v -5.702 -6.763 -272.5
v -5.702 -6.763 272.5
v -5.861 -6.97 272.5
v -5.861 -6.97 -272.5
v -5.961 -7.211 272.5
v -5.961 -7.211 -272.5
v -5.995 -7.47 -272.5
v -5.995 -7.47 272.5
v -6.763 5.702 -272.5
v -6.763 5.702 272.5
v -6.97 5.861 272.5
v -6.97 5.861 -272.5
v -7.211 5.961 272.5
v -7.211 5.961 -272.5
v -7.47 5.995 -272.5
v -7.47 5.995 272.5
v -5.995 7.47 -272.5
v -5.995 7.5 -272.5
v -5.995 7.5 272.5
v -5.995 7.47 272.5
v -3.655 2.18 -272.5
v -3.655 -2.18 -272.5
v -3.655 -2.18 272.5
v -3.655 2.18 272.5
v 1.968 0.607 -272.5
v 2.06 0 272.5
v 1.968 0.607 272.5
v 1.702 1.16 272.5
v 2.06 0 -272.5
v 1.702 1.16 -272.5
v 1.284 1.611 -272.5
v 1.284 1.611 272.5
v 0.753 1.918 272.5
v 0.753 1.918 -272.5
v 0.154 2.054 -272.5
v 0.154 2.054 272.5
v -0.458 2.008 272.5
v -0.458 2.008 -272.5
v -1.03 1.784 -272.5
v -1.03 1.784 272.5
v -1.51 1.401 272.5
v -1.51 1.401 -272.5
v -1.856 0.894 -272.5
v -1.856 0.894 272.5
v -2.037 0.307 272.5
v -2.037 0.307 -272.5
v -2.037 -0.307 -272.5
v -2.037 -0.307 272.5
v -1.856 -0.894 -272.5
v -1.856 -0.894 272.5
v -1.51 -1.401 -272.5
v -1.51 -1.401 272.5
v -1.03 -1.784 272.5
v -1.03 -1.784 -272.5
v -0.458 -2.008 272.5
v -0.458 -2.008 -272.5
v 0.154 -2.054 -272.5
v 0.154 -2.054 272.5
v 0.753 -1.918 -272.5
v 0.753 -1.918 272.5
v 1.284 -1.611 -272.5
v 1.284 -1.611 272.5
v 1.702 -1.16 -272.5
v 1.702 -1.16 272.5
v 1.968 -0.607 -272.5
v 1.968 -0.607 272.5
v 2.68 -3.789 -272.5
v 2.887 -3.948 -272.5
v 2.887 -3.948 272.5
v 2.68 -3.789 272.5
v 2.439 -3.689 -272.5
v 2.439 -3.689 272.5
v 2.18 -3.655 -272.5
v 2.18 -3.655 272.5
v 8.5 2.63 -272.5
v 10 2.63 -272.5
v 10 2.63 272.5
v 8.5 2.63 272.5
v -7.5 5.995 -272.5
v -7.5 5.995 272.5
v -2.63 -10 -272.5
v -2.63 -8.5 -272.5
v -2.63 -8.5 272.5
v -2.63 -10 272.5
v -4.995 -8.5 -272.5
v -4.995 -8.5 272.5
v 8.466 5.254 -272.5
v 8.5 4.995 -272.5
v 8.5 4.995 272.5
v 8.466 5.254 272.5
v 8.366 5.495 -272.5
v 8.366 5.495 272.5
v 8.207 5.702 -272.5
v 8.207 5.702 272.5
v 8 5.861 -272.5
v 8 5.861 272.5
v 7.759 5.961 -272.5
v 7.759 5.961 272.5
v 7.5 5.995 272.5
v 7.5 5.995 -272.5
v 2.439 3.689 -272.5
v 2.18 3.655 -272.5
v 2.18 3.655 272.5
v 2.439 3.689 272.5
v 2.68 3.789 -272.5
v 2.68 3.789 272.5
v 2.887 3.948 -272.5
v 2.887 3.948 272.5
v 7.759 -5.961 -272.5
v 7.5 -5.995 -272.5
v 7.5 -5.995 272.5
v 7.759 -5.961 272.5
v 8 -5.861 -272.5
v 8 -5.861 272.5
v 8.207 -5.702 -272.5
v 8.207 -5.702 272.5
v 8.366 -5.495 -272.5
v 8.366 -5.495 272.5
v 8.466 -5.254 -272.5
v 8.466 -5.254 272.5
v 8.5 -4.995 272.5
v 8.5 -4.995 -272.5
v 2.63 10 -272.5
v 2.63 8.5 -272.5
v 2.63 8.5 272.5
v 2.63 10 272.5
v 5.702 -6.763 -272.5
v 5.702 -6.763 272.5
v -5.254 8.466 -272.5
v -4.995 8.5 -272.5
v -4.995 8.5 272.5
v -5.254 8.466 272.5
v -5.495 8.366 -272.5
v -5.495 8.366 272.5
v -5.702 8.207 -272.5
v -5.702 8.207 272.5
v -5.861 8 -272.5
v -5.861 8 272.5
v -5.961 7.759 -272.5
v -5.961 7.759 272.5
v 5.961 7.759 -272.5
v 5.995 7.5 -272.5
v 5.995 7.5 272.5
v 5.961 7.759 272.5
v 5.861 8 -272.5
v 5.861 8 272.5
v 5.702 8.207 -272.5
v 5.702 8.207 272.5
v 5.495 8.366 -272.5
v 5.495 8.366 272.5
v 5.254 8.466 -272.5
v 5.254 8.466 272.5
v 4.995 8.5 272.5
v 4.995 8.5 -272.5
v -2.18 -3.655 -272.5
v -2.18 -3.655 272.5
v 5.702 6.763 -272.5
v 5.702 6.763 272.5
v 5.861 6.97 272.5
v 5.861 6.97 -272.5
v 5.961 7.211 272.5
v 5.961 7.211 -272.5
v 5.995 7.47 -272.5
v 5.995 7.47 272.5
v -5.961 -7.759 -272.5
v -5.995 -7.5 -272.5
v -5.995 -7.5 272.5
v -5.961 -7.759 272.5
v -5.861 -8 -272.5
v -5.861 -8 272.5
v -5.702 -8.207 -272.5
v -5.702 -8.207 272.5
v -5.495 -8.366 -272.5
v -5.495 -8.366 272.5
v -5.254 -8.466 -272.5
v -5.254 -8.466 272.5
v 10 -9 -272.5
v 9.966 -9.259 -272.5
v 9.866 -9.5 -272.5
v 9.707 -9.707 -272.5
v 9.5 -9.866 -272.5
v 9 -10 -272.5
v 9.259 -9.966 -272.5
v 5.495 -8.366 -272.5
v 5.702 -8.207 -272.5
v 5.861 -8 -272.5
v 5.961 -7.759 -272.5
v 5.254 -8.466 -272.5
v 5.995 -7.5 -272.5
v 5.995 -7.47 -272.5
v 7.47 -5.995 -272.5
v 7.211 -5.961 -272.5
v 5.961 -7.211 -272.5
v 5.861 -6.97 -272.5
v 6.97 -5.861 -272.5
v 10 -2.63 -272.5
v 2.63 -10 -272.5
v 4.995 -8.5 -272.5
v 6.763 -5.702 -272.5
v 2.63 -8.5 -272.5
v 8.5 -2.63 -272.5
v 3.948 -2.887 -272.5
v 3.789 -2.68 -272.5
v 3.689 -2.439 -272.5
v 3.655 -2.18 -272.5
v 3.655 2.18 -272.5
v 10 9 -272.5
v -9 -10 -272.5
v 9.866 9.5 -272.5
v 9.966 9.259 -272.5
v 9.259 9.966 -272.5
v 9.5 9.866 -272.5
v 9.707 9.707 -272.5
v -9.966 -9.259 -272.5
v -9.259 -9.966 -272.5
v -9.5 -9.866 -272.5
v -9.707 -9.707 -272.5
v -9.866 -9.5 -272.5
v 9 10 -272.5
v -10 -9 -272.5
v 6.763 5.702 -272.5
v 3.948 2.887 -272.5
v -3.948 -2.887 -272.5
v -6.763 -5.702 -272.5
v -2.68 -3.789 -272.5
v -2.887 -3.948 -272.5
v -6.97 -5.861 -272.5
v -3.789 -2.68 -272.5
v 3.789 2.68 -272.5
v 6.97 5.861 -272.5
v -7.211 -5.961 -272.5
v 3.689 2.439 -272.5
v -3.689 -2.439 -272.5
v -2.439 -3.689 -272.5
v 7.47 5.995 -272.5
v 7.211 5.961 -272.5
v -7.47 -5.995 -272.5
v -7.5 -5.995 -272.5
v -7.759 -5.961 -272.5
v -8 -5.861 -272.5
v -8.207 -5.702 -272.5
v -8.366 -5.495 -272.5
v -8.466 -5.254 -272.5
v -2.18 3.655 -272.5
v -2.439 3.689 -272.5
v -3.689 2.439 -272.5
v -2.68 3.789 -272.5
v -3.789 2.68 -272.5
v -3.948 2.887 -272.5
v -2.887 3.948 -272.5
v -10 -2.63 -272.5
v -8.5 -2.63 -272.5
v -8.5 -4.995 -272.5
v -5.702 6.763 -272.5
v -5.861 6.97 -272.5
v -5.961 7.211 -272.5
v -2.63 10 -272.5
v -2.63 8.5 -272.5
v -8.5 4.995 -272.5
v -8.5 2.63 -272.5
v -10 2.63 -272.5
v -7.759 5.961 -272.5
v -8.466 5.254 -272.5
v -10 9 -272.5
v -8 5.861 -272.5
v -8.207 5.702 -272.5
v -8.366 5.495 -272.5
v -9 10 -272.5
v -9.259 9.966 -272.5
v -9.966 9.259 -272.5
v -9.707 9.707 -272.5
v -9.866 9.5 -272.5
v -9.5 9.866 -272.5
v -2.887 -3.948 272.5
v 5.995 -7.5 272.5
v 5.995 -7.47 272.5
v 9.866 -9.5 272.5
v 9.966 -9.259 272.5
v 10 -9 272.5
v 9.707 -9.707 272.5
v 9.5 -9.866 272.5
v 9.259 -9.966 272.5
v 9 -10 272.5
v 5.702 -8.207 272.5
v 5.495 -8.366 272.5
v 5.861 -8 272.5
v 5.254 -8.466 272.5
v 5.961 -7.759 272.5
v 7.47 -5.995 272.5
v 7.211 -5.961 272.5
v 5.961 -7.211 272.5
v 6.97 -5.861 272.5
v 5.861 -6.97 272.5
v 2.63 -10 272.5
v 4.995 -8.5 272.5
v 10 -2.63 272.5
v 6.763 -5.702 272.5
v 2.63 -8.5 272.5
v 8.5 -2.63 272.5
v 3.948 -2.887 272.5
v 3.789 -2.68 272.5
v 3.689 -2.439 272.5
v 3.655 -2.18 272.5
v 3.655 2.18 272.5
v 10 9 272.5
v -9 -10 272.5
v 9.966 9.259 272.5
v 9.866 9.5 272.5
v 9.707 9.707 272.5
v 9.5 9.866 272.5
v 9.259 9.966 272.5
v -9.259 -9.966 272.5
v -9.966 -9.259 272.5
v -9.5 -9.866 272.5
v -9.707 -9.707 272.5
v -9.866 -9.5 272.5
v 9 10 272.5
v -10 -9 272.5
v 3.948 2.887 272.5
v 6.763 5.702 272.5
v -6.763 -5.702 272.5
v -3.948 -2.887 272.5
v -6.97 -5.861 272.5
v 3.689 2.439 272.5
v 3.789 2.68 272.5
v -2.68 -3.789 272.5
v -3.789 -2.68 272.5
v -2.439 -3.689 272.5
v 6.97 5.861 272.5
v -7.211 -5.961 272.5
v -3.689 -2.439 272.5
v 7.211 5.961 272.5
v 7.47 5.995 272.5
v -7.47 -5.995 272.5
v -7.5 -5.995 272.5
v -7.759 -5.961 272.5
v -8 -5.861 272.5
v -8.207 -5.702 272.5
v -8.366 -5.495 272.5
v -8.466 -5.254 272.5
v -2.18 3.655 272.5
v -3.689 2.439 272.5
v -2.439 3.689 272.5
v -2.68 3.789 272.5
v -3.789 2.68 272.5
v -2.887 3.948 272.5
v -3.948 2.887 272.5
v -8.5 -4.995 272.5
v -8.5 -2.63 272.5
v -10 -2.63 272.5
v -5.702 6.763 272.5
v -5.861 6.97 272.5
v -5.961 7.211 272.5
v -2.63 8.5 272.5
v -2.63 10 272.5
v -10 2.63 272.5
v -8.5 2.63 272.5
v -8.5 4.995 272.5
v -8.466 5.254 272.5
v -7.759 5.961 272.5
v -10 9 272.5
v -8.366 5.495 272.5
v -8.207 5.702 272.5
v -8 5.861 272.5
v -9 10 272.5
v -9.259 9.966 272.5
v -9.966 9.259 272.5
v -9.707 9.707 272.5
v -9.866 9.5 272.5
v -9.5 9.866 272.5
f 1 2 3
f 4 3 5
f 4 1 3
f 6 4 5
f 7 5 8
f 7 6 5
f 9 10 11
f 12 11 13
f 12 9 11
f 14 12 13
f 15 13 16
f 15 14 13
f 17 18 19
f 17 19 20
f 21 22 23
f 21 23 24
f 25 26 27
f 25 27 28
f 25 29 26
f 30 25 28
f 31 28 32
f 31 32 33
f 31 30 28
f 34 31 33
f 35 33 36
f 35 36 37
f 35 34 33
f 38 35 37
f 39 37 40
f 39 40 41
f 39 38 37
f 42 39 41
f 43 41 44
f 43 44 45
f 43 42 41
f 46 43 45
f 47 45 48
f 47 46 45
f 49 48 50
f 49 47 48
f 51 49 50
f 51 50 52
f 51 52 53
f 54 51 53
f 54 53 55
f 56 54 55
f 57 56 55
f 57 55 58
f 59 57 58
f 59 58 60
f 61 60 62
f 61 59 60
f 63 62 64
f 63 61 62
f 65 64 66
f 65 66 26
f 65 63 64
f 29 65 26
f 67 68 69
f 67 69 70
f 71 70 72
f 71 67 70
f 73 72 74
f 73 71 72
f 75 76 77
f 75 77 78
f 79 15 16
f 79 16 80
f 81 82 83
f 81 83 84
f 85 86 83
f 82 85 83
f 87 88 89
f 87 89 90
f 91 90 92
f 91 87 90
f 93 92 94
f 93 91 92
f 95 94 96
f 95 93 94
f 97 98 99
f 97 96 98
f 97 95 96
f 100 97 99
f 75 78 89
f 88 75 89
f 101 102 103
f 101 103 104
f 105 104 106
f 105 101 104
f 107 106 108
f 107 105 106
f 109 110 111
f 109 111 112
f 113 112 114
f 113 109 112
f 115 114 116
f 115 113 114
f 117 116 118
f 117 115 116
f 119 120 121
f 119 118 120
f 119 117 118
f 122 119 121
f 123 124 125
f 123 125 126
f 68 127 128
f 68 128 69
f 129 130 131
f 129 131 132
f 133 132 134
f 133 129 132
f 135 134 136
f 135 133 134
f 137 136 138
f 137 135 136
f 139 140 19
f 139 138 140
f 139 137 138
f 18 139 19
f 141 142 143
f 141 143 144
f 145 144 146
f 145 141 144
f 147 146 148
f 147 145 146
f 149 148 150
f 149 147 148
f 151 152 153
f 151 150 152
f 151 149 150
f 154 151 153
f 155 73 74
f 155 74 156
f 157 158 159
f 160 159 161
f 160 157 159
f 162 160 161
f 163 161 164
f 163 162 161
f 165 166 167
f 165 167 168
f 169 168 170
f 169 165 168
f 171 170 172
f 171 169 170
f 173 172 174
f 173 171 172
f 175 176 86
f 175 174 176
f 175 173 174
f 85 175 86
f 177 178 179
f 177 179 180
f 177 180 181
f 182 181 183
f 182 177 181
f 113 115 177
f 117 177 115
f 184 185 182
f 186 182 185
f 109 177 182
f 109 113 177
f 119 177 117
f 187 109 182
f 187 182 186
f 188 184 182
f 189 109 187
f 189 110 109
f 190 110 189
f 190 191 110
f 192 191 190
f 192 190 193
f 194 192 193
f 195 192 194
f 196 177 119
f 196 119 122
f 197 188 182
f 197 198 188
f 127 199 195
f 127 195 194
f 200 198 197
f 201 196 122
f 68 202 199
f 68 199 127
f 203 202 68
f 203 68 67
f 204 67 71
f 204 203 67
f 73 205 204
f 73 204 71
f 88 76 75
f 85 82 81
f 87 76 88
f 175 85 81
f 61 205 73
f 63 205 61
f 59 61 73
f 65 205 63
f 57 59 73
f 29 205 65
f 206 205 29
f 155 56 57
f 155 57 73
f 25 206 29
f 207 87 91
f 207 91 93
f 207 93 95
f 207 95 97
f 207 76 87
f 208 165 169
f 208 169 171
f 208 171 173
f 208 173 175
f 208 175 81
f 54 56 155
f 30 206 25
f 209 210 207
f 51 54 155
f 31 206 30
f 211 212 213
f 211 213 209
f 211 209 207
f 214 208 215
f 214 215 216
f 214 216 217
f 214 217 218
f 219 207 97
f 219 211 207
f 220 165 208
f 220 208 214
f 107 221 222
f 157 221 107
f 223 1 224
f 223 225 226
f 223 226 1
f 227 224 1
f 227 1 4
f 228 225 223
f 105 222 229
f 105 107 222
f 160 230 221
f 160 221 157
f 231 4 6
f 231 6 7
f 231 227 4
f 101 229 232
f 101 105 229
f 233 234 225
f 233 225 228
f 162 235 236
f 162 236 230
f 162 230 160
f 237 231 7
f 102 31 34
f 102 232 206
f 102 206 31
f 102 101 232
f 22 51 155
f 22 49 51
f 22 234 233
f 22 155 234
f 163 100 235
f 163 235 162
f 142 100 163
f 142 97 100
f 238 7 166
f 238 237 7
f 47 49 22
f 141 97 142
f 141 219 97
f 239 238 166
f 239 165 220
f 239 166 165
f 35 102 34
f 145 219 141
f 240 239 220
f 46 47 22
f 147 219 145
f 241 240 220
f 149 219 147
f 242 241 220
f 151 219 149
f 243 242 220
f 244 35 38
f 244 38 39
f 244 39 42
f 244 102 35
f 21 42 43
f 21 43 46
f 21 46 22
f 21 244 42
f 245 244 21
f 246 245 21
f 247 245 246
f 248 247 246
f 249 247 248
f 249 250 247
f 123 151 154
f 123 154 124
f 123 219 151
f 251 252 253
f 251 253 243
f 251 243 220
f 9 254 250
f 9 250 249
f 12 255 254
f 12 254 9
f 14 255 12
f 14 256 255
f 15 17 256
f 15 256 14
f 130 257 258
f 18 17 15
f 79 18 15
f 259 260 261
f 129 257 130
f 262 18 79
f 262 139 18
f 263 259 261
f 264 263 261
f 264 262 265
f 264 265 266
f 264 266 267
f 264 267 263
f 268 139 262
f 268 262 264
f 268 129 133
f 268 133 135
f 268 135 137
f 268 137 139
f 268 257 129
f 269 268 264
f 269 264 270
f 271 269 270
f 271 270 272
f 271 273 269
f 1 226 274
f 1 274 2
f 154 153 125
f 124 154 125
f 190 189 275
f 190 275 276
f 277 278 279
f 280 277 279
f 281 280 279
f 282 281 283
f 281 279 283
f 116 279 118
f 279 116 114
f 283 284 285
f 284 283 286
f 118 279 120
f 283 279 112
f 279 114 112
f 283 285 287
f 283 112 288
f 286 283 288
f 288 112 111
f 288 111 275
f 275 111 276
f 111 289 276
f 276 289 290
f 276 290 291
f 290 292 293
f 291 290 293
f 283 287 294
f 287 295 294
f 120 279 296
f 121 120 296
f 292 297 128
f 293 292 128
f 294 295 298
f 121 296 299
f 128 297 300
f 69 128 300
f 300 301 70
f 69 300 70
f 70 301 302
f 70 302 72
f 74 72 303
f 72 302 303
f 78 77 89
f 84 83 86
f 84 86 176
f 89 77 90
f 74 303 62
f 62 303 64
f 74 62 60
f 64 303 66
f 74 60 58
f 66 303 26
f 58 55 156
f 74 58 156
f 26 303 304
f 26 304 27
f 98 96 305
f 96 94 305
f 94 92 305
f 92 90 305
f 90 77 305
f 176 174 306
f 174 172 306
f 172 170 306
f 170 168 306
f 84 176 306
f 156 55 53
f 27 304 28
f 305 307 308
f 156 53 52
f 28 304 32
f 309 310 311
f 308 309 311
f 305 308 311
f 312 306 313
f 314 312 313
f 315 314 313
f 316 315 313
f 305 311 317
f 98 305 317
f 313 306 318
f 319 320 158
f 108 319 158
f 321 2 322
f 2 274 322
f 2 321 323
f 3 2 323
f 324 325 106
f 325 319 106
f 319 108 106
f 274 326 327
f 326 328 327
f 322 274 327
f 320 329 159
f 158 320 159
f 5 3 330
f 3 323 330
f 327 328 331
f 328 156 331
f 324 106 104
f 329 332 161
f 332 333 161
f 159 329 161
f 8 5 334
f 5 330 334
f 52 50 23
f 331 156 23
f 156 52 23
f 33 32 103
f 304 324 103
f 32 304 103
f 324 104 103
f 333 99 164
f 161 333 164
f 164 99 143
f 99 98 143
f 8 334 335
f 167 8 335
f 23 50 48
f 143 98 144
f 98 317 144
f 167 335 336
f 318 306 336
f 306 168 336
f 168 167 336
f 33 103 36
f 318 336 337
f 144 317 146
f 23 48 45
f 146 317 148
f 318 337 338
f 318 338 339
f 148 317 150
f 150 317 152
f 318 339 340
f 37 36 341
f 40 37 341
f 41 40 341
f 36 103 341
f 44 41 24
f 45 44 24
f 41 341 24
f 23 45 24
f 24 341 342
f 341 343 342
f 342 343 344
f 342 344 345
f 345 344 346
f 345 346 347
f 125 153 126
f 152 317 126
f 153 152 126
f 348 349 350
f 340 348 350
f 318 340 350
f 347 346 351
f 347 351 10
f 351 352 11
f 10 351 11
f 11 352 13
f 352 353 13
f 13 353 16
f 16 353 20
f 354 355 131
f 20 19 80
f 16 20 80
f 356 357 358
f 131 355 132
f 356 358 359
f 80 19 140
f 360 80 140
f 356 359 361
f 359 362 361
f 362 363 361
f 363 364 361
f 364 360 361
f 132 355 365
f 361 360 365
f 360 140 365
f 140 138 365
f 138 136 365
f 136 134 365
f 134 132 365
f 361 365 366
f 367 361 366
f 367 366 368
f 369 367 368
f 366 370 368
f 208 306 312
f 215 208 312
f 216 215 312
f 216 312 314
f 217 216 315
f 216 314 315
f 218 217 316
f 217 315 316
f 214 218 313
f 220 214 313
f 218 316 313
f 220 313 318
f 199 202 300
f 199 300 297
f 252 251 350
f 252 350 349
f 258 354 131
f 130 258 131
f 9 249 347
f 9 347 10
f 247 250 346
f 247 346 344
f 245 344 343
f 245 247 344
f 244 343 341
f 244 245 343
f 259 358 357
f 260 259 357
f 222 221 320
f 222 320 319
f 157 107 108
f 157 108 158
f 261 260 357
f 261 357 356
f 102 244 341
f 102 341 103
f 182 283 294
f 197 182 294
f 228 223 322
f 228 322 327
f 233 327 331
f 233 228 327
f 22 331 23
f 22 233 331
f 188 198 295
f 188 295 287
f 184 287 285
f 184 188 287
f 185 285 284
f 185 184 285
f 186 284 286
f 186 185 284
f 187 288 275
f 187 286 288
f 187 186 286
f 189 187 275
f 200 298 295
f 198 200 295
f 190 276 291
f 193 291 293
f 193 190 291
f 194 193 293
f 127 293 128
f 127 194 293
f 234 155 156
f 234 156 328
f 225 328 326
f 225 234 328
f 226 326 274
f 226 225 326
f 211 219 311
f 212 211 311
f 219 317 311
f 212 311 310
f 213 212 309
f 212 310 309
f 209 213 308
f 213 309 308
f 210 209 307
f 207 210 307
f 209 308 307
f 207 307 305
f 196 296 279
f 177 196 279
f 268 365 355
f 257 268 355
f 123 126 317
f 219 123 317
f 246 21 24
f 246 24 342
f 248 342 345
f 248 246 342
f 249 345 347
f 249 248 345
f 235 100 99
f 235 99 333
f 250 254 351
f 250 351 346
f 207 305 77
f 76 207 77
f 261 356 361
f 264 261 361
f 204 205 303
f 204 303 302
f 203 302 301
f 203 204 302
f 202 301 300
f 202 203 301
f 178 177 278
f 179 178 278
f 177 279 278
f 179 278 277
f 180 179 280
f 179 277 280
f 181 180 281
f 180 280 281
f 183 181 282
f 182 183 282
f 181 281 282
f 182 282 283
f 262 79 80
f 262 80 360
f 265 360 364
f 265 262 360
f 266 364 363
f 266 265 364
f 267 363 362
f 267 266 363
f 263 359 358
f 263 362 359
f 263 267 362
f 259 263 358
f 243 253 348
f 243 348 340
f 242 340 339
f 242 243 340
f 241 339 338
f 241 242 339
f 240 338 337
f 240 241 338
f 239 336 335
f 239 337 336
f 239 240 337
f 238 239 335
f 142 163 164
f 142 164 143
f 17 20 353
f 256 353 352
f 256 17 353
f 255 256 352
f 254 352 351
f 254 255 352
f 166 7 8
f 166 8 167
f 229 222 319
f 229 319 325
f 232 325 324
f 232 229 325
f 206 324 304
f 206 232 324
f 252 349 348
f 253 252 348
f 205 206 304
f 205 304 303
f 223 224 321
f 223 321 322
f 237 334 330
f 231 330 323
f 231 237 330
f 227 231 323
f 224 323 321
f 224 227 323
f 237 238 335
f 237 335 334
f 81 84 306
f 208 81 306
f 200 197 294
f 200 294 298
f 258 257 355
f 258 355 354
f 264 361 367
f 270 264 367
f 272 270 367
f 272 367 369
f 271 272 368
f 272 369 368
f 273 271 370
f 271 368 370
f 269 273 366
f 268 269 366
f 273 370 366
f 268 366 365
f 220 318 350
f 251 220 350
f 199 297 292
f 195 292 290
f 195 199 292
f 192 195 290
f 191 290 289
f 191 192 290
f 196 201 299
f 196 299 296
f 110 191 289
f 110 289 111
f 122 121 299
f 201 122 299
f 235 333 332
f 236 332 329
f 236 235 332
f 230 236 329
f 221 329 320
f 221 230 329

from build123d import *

# Parameters (mm, degrees)
SKETCH1_R           = 2.06
BOSS_EXTRUDE1_DEPTH = 272.5
CUT_EXTRUDE1_DEPTH  = 546
CIRPATTERN1_COUNT   = 4


with BuildPart() as part:
    # Sketch1 → Boss-Extrude1 (new body, symmetric)
    with BuildSketch(Plane.XY):
        with BuildLine():
            Line((-9, 10), (9, 10))
            ThreePointArc((9, 10), (9.707106781, 9.707106781), (10, 9))
            Line((10, 9), (10, -9))
            ThreePointArc((10, -9), (9.707106781, -9.707106781), (9, -10))
            Line((9, -10), (-9, -10))
            ThreePointArc((-9, -10), (-9.707106781, -9.707106781), (-10, -9))
            Line((-10, -9), (-10, 9))
            ThreePointArc((-10, 9), (-9.707106781, 9.707106781), (-9, 10))
        make_face()
        Circle(SKETCH1_R, mode=Mode.SUBTRACT)
    extrude(amount=BOSS_EXTRUDE1_DEPTH, both=True)

    # Sketch2 → Cut-Extrude1 (cut, through all)
    with BuildSketch(Plane(origin=(0, 0, -272.5), x_dir=(-1, 0, 0), z_dir=(0, 0, -1))):
        with BuildLine():
            Line((-10, 2.63), (-8.5, 2.63))
            Line((-8.5, 2.63), (-8.5, 4.995))
            ThreePointArc((-8.5, 4.995), (-8.207106781, 5.702106781), (-7.5, 5.995))
            Line((-7.5, 5.995), (-7.469873734, 5.995))
            ThreePointArc((-7.469873734, 5.995), (-7.087190302, 5.918879533), (-6.762766953, 5.702106781))
            Line((-6.762766953, 5.702106781), (-3.947893219, 2.887233047))
            ThreePointArc((-3.947893219, 2.887233047), (-3.731120467, 2.562809698), (-3.655, 2.180126266))
            Line((-3.655, 2.180126266), (-3.655, -2.180126266))
            ThreePointArc((-3.655, -2.180126266), (-3.731120467, -2.562809698), (-3.947893219, -2.887233047))
            Line((-3.947893219, -2.887233047), (-6.762766953, -5.702106781))
            ThreePointArc((-6.762766953, -5.702106781), (-7.087190302, -5.918879533), (-7.469873734, -5.995))
            Line((-7.469873734, -5.995), (-7.5, -5.995))
            ThreePointArc((-7.5, -5.995), (-8.207106781, -5.702106781), (-8.5, -4.995))
            Line((-8.5, -4.995), (-8.5, -2.63))
            Line((-8.5, -2.63), (-10, -2.63))
            Line((-10, -2.63), (-10, 2.63))
        make_face()
    cut_extrude1 = extrude(amount=-CUT_EXTRUDE1_DEPTH, mode=Mode.SUBTRACT)

    # CirPattern1: Cut-Extrude1 ×4 about axis
    cirpattern1_axis = Axis((0, 0, 0), (0, 0, 1))
    for i in range(1, CIRPATTERN1_COUNT):
        add(cut_extrude1.rotate(cirpattern1_axis, i * 360 / CIRPATTERN1_COUNT), mode=Mode.SUBTRACT)


solid = part.part
